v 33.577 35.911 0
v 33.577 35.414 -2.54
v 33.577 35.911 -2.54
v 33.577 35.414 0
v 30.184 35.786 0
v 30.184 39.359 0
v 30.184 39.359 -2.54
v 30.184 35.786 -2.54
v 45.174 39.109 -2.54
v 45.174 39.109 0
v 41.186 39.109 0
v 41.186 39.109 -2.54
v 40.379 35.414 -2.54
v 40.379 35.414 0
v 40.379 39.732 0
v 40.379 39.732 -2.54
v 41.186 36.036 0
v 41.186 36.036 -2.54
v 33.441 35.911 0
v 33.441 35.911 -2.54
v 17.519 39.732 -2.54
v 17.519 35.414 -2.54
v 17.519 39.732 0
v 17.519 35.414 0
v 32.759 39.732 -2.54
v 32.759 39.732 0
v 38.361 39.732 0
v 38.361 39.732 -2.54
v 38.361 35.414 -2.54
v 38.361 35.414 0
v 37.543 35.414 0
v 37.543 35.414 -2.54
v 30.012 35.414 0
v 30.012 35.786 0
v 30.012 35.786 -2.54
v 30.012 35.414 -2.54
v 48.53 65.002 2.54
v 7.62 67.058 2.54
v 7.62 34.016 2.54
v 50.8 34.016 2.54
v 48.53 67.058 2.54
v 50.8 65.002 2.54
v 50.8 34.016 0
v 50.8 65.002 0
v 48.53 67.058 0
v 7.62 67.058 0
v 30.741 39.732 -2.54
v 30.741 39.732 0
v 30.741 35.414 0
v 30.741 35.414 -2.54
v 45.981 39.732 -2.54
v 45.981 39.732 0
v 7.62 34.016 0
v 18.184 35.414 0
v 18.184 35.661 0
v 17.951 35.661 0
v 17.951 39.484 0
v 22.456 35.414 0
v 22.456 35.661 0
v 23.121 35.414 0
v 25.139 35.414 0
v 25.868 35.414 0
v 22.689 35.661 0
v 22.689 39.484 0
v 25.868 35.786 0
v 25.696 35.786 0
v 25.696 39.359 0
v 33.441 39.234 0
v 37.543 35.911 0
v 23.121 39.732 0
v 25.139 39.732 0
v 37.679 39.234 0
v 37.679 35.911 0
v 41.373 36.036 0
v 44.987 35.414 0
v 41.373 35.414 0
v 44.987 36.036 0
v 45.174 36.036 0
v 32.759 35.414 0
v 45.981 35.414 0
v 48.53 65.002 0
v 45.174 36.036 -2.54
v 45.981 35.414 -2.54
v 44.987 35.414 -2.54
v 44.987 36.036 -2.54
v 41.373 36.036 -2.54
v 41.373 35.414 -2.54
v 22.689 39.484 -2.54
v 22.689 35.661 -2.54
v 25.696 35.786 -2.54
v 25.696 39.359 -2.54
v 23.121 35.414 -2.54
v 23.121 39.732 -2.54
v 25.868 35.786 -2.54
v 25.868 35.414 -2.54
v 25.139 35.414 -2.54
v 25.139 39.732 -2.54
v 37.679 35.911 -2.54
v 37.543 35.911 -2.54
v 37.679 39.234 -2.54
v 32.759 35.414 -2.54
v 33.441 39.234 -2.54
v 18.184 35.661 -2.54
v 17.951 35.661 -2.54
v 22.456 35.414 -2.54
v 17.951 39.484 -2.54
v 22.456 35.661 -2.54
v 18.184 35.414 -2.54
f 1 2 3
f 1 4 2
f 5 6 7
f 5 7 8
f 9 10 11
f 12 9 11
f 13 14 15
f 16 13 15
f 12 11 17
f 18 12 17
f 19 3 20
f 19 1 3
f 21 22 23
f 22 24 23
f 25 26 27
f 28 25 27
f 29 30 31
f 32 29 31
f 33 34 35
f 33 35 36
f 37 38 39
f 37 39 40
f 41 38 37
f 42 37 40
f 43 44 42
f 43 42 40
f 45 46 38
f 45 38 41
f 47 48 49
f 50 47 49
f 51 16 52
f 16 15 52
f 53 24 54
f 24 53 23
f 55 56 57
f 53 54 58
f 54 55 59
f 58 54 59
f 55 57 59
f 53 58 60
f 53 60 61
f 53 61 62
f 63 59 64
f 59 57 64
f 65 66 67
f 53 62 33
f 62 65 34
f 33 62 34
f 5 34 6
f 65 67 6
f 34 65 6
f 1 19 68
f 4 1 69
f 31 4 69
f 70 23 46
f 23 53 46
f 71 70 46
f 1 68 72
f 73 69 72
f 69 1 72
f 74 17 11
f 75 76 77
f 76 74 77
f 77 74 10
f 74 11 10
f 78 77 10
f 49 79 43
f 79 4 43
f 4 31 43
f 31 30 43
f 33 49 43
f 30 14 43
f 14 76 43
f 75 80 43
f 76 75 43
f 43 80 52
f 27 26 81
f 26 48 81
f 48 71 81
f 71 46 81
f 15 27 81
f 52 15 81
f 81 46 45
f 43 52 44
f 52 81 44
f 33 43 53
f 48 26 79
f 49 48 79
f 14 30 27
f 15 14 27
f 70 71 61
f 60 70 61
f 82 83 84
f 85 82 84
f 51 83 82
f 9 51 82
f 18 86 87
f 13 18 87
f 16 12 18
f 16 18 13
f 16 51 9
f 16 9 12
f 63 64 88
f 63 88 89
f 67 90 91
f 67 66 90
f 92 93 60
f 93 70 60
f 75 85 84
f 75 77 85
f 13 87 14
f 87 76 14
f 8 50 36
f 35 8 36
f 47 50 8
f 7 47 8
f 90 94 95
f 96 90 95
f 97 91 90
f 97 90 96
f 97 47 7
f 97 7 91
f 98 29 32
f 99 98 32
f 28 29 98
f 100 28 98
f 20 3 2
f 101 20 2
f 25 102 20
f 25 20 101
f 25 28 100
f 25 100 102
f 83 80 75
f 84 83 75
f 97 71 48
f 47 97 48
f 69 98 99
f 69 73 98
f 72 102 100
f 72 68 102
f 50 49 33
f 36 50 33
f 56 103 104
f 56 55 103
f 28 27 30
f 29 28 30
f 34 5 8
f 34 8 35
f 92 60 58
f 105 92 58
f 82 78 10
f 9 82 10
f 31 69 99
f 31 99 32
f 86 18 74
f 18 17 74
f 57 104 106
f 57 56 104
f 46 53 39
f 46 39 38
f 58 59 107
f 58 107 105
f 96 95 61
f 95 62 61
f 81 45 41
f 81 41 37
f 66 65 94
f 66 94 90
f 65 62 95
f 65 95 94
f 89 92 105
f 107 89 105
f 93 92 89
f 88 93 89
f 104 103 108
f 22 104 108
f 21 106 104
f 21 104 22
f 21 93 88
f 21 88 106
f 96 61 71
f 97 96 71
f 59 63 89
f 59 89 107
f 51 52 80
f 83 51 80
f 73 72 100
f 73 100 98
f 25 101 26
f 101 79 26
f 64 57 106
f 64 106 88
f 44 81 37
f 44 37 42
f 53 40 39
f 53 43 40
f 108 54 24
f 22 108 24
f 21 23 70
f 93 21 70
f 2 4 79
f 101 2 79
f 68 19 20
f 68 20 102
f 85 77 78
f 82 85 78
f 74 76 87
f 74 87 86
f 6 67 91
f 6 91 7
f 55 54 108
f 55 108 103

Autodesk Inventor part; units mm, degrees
ref_plane "YZ Plane" through (0, 0, 0) normal (1, 0, 0) x (0, 1, 0)
ref_plane "XZ Plane" through (0, 0, 0) normal (0, 1, 0) x (-1, 0, 0)
ref_plane "XY Plane" through (0, 0, 0) normal (0, 0, 1) x (1, 0, 0)
sketch "Sketch2" plane through (0, 0, 0) normal (0, 0, 1) x (1, 0, 0)
  line L0 (7.62, 67.0577) -> (50.8, 67.0577)
  line L1 (50.8, 67.0577) -> (50.8, 16.2577)
  line L2 (50.8, 16.2577) -> (7.62, 16.2577)
  line L3 (7.62, 16.2577) -> (7.62, 67.0577)
  point P0 (0, 0)
  dimension "d45" = 43.18
  dimension "d46" = 50.8
extrude "Extrusion1" add sketch "Sketch2" along normal blind 2.54
sketch "Sketch3" plane through (0, 0, 0) normal (0, 0, -1) x (-1, 0, 0)
  circle A0 centre (-43.18, 59.4377) radius 4.0005
  line L0 (-50.8, 16.2577) -> (-50.8, 67.0577) projected
  line L1 (-50.8, 67.0577) -> (-7.62, 67.0577) projected
  circle A1 centre (-43.18, 59.4377) radius 5.2705
  line L2 (-7.62, 67.0577) -> (-7.62, 16.2577) projected
  line L3 (-7.62, 16.2577) -> (-50.8, 16.2577) projected
  circle A2 centre (-43.18, 46.7377) radius 5.2705
  circle A3 centre (-30.48, 59.4377) radius 5.2705
  circle A4 centre (-30.48, 46.7377) radius 5.2705
  circle A5 centre (-17.78, 59.4377) radius 5.2705
  circle A6 centre (-17.78, 46.7377) radius 5.2705
  line L4 (-45.1739, 39.1092) -> (-41.1861, 39.1092)
  line L5 (-41.1861, 39.1092) -> (-41.1861, 36.0358)
  line L6 (-41.1861, 36.0358) -> (-45.1739, 36.0358)
  line L7 (-45.1739, 36.0358) -> (-45.1739, 39.1092)
  line L8 (-45.1739, 39.1092) -> (-41.1861, 36.0358) construction
  line L9 (-41.1861, 39.1092) -> (-45.1739, 36.0358) construction
  line L10 (-45.9813, 35.4135) -> (-40.3787, 35.4135)
  line L11 (-40.3787, 35.4135) -> (-40.3787, 39.7315)
  line L12 (-40.3787, 39.7315) -> (-45.9813, 39.7315)
  line L13 (-45.9813, 39.7315) -> (-45.9813, 35.4135)
  line L14 (-45.9813, 35.4135) -> (-40.3787, 39.7315) construction
  line L15 (-40.3787, 35.4135) -> (-45.9813, 39.7315) construction
  circle A7 centre (-30.48, 59.4377) radius 4.1255
  circle A8 centre (-17.78, 59.4377) radius 4.2505
  circle A9 centre (-43.18, 46.7377) radius 4.3755
  circle A10 centre (-30.48, 46.7377) radius 4.5005
  circle A11 centre (-17.78, 46.7377) radius 4.6255
  line L16 (-32.7587, 39.7315) -> (-38.3613, 39.7315)
  line L17 (-38.3613, 39.7315) -> (-38.3613, 35.4135)
  line L18 (-38.3613, 35.4135) -> (-32.7587, 35.4135)
  line L19 (-32.7587, 35.4135) -> (-32.7587, 39.7315)
  line L20 (-25.1387, 39.7315) -> (-30.7413, 39.7315)
  line L21 (-30.7413, 39.7315) -> (-30.7413, 35.4135)
  line L22 (-30.7413, 35.4135) -> (-25.1387, 35.4135)
  line L23 (-25.1387, 35.4135) -> (-25.1387, 39.7315)
  line L24 (-17.5187, 39.7315) -> (-23.1213, 39.7315)
  line L25 (-23.1213, 39.7315) -> (-23.1213, 35.4135)
  line L26 (-23.1213, 35.4135) -> (-17.5187, 35.4135)
  line L27 (-17.5187, 35.4135) -> (-17.5187, 39.7315)
  line L28 (-9.8987, 39.7315) -> (-15.5013, 39.7315)
  line L29 (-15.5013, 39.7315) -> (-15.5013, 35.4135)
  line L30 (-15.5013, 35.4135) -> (-9.8987, 35.4135)
  line L31 (-9.8987, 35.4135) -> (-9.8987, 39.7315)
  line L32 (-37.6789, 35.9108) -> (-33.4411, 35.9108)
  line L33 (-33.4411, 35.9108) -> (-33.4411, 39.2342)
  line L34 (-33.4411, 39.2342) -> (-37.6789, 39.2342)
  line L35 (-37.6789, 39.2342) -> (-37.6789, 35.9108)
  line L36 (-37.6789, 35.9108) -> (-33.4411, 39.2342) construction
  line L37 (-33.4411, 35.9108) -> (-37.6789, 39.2342) construction
  line L38 (-30.1839, 35.7858) -> (-25.6961, 35.7858)
  line L39 (-25.6961, 35.7858) -> (-25.6961, 39.3592)
  line L40 (-25.6961, 39.3592) -> (-30.1839, 39.3592)
  line L41 (-30.1839, 39.3592) -> (-30.1839, 35.7858)
  line L42 (-30.1839, 35.7858) -> (-25.6961, 39.3592) construction
  line L43 (-25.6961, 35.7858) -> (-30.1839, 39.3592) construction
  line L44 (-22.6889, 35.6608) -> (-17.9511, 35.6608)
  line L45 (-17.9511, 35.6608) -> (-17.9511, 39.4842)
  line L46 (-17.9511, 39.4842) -> (-22.6889, 39.4842)
  line L47 (-22.6889, 39.4842) -> (-22.6889, 35.6608)
  line L48 (-22.6889, 35.6608) -> (-17.9511, 39.4842) construction
  line L49 (-17.9511, 35.6608) -> (-22.6889, 39.4842) construction
  line L50 (-45.1739, 35.3552) -> (-41.1861, 35.3552)
  line L51 (-41.1861, 35.3552) -> (-41.1861, 36.7164)
  line L52 (-41.1861, 36.7164) -> (-45.1739, 36.7164)
  line L53 (-45.1739, 36.7164) -> (-45.1739, 35.3552)
  line L54 (-45.1739, 35.3552) -> (-41.1861, 36.7164) construction
  line L55 (-41.1861, 35.3552) -> (-45.1739, 36.7164) construction
  point P0 (0, 0)
  point P1 (-43.18, 37.5725)
  point P2 (-43.18, 37.5725)
  point P3 (-35.56, 37.5725)
  point P4 (-27.94, 37.5725)
  point P5 (-20.32, 37.5725)
  point P6 (-12.7, 37.5725)
  point P7 (-43.18, 36.0358)
  dimension "d49" = 7.62
  dimension "d50" = 7.62
  dimension "d51" = 1.27
  dimension "d56" = 12.7
  dimension "d59" = 12.7
  dimension "d64" = 3.9878
  dimension "d65" = 3.0734
  dimension "d66" = 9.1652
  dimension "d67" = 2.159
  dimension "d77" = 8.001
  dimension "d78" = 8.251
  dimension "d80" = 8.501
  dimension "d81" = 8.751
  dimension "d82" = 9.001
  dimension "d83" = 9.251
  dimension "d90" = 7.62
  dimension "d95" = 4.2378
  dimension "d96" = 4.4878
  dimension "d97" = 4.7378
  dimension "d98" = 3.3234
  dimension "d99" = 3.5734
sketch "Sketch4" plane through (0, 0, 0) normal (0, 0, -1) x (-1, 0, 0)
  line L0 (-50.8, 67.0577) -> (-7.62, 67.0577) projected
  line L1 (-50.8, 16.2577) -> (-50.8, 67.0577) projected
  line L2 (-50.8, 67.0577) -> (-48.5295, 67.0577)
  line L3 (-48.5295, 67.0577) -> (-48.5295, 65.0024)
  line L4 (-48.5295, 65.0024) -> (-50.8, 65.0024)
  line L5 (-50.8, 65.0024) -> (-50.8, 67.0577)
  point P0 (0, 0)
extrude "Extrusion3" cut sketch "Sketch4" against normal blind 2.54
sketch "Sketch5" plane through (0, 0, 0) normal (0, 0, -1) x (-1, 0, 0)
  line L0 (-45.1739, 39.1092) -> (-41.1861, 39.1092)
  line L1 (-41.1861, 39.1092) -> (-41.1861, 36.0358)
  line L2 (-41.1861, 36.0358) -> (-45.1739, 36.0358)
  line L3 (-45.1739, 36.0358) -> (-45.1739, 39.1092)
  line L4 (-45.1739, 39.1092) -> (-41.1861, 36.0358) construction
  line L5 (-41.1861, 39.1092) -> (-45.1739, 36.0358) construction
  line L6 (-45.9813, 35.4135) -> (-40.3787, 35.4135)
  line L7 (-40.3787, 35.4135) -> (-40.3787, 39.7315)
  line L8 (-40.3787, 39.7315) -> (-45.9813, 39.7315)
  line L9 (-45.9813, 39.7315) -> (-45.9813, 35.4135)
  line L10 (-45.9813, 35.4135) -> (-40.3787, 39.7315) construction
  line L11 (-40.3787, 35.4135) -> (-45.9813, 39.7315) construction
  line L12 (-32.7587, 39.7315) -> (-38.3613, 39.7315)
  line L13 (-38.3613, 39.7315) -> (-38.3613, 35.4135)
  line L14 (-38.3613, 35.4135) -> (-32.7587, 35.4135)
  line L15 (-32.7587, 35.4135) -> (-32.7587, 39.7315)
  line L16 (-25.1387, 39.7315) -> (-30.7413, 39.7315)
  line L17 (-30.7413, 39.7315) -> (-30.7413, 35.4135)
  line L18 (-30.7413, 35.4135) -> (-25.1387, 35.4135)
  line L19 (-25.1387, 35.4135) -> (-25.1387, 39.7315)
  line L20 (-17.5187, 39.7315) -> (-23.1213, 39.7315)
  line L21 (-23.1213, 39.7315) -> (-23.1213, 35.4135)
  line L22 (-23.1213, 35.4135) -> (-17.5187, 35.4135)
  line L23 (-17.5187, 35.4135) -> (-17.5187, 39.7315)
  line L24 (-9.8987, 39.7315) -> (-15.5013, 39.7315)
  line L25 (-15.5013, 39.7315) -> (-15.5013, 35.4135)
  line L26 (-15.5013, 35.4135) -> (-9.8987, 35.4135)
  line L27 (-37.6789, 35.9108) -> (-33.4411, 35.9108)
  line L28 (-33.4411, 35.9108) -> (-33.4411, 39.2342)
  line L29 (-33.4411, 39.2342) -> (-37.6789, 39.2342)
  line L30 (-37.6789, 39.2342) -> (-37.6789, 35.9108)
  line L31 (-37.6789, 35.9108) -> (-33.4411, 39.2342) construction
  line L32 (-33.4411, 35.9108) -> (-37.6789, 39.2342) construction
  line L33 (-30.1839, 35.7858) -> (-25.6961, 35.7858)
  line L34 (-25.6961, 35.7858) -> (-25.6961, 39.3592)
  line L35 (-25.6961, 39.3592) -> (-30.1839, 39.3592)
  line L36 (-30.1839, 39.3592) -> (-30.1839, 35.7858)
  line L37 (-30.1839, 35.7858) -> (-25.6961, 39.3592) construction
  line L38 (-25.6961, 35.7858) -> (-30.1839, 39.3592) construction
  line L39 (-22.6889, 35.6608) -> (-17.9511, 35.6608)
  line L40 (-17.9511, 35.6608) -> (-17.9511, 39.4842)
  line L41 (-17.9511, 39.4842) -> (-22.6889, 39.4842)
  line L42 (-22.6889, 39.4842) -> (-22.6889, 35.6608)
  line L43 (-22.6889, 35.6608) -> (-17.9511, 39.4842) construction
  line L44 (-17.9511, 35.6608) -> (-22.6889, 39.4842) construction
  line L45 (-45.1516, 35.2931) -> (-41.1861, 36.7869) construction
  line L46 (-41.1861, 35.3552) -> (-45.1739, 36.7164) construction
  line L47 (-44.9867, 35.3552) -> (-41.3733, 35.3552)
  line L48 (-41.3733, 35.3552) -> (-41.3733, 36.7164)
  line L49 (-41.3733, 36.7164) -> (-44.9867, 36.7164)
  line L50 (-44.9867, 36.7164) -> (-44.9867, 35.3552)
  line L51 (-44.9867, 35.3552) -> (-41.3733, 36.7164) construction
  line L52 (-41.3733, 35.3552) -> (-44.9867, 36.7164) construction
  line L53 (-37.5427, 35.3747) -> (-33.5773, 35.3747)
  line L54 (-33.5773, 35.3747) -> (-33.5773, 36.447)
  line L55 (-33.5773, 36.447) -> (-37.5427, 36.447)
  line L56 (-37.5427, 36.447) -> (-37.5427, 35.3747)
  line L57 (-37.5427, 35.3747) -> (-33.5773, 36.447) construction
  line L58 (-33.5773, 35.3747) -> (-37.5427, 36.447) construction
  line L59 (-30.0124, 35.3468) -> (-25.8676, 35.3468)
  line L60 (-25.8676, 35.3468) -> (-25.8676, 36.2248)
  line L61 (-25.8676, 36.2248) -> (-30.0124, 36.2248)
  line L62 (-30.0124, 36.2248) -> (-30.0124, 35.3468)
  line L63 (-30.0124, 35.3468) -> (-25.8676, 36.2248) construction
  line L64 (-25.8676, 35.3468) -> (-30.0124, 36.2248) construction
  line L65 (-22.4558, 35.2013) -> (-18.1842, 35.2013)
  line L66 (-18.1842, 35.2013) -> (-18.1842, 36.1203)
  line L67 (-18.1842, 36.1203) -> (-22.4558, 36.1203)
  line L68 (-22.4558, 36.1203) -> (-22.4558, 35.2013)
  line L69 (-22.4558, 35.2013) -> (-18.1842, 36.1203) construction
  line L70 (-18.1842, 35.2013) -> (-22.4558, 36.1203) construction
  line L71 (-45.9813, 32.6353) -> (-41.9935, 32.6353)
  line L72 (-41.9935, 32.6353) -> (-41.9935, 29.5619)
  line L73 (-41.9935, 29.5619) -> (-45.9813, 29.5619)
  line L74 (-45.9813, 29.5619) -> (-45.9813, 32.6353)
  point P0 (0, 0)
  point P1 (-43.18, 37.5725)
  point P2 (-43.18, 37.5725)
  point P3 (-35.56, 37.5725)
  point P4 (-27.94, 37.5725)
  point P5 (-20.32, 37.5725)
  point P6 (-12.7, 37.5725)
  point P7 (-43.18, 36.0358)
  point P8 (-35.56, 35.9108)
  point P9 (-27.94, 35.7858)
  point P10 (-20.32, 35.6608)
  point P11 (-22.4558, 35.4135)
  point P12 (-22.4558, 35.6608)
  point P13 (-18.1842, 35.6608)
  point P14 (-18.1842, 35.4135)
  point P15 (-30.0124, 35.4135)
  point P16 (-30.0124, 35.7858)
  point P17 (-25.8676, 35.7858)
  point P18 (-25.8676, 35.4135)
  point P19 (-37.5427, 35.4135)
  point P20 (-37.5427, 35.9108)
  point P21 (-33.5773, 35.9108)
  point P22 (-33.5773, 35.4135)
  point P23 (-44.9867, 35.4135)
  point P24 (-44.9867, 36.0358)
  point P25 (-41.3733, 36.0358)
  point P26 (-41.3733, 35.4135)
  dimension "d102" = 3.0734
  dimension "d103" = 2.159
  dimension "d104" = 7.62
  dimension "d106" = 4.4878
  dimension "d107" = 4.7378
  dimension "d108" = 3.3234
  dimension "d109" = 3.5734
  dimension "d114" = 4.2378
  dimension "d115" = 3.0734
  dimension "d116" = 3.9878
extrude "Extrusion5" add sketch "Sketch5" along normal blind 2.54 contours L3 L2 L50 L6 L9 L8 L7 L48 L1 L0 | L15 L14 L54 L27 L28 L29 L30 L56 L13 L12 | L19 L18 L60 L33 L34 L35 L36 L62 L17 L16 | L23 L22 L66 L39 L40 L41 L42 L68 L21 L20
sketch "Sketch6" plane through (0, 0, 0) normal (0, 0, -1) x (-1, 0, 0)
  line L0 (-52.3953, 34.0161) -> (-4.7261, 34.0161)
  line L1 (-4.7261, 34.0161) -> (-4.7261, 12.2528)
  line L2 (-4.7261, 12.2528) -> (-52.3953, 12.2528)
  line L3 (-52.3953, 12.2528) -> (-52.3953, 34.0161)
  point P0 (0, 0)
extrude "Extrusion6" cut sketch "Sketch6" against normal blind 2.54
properties part number "magnet_hall_testing"
